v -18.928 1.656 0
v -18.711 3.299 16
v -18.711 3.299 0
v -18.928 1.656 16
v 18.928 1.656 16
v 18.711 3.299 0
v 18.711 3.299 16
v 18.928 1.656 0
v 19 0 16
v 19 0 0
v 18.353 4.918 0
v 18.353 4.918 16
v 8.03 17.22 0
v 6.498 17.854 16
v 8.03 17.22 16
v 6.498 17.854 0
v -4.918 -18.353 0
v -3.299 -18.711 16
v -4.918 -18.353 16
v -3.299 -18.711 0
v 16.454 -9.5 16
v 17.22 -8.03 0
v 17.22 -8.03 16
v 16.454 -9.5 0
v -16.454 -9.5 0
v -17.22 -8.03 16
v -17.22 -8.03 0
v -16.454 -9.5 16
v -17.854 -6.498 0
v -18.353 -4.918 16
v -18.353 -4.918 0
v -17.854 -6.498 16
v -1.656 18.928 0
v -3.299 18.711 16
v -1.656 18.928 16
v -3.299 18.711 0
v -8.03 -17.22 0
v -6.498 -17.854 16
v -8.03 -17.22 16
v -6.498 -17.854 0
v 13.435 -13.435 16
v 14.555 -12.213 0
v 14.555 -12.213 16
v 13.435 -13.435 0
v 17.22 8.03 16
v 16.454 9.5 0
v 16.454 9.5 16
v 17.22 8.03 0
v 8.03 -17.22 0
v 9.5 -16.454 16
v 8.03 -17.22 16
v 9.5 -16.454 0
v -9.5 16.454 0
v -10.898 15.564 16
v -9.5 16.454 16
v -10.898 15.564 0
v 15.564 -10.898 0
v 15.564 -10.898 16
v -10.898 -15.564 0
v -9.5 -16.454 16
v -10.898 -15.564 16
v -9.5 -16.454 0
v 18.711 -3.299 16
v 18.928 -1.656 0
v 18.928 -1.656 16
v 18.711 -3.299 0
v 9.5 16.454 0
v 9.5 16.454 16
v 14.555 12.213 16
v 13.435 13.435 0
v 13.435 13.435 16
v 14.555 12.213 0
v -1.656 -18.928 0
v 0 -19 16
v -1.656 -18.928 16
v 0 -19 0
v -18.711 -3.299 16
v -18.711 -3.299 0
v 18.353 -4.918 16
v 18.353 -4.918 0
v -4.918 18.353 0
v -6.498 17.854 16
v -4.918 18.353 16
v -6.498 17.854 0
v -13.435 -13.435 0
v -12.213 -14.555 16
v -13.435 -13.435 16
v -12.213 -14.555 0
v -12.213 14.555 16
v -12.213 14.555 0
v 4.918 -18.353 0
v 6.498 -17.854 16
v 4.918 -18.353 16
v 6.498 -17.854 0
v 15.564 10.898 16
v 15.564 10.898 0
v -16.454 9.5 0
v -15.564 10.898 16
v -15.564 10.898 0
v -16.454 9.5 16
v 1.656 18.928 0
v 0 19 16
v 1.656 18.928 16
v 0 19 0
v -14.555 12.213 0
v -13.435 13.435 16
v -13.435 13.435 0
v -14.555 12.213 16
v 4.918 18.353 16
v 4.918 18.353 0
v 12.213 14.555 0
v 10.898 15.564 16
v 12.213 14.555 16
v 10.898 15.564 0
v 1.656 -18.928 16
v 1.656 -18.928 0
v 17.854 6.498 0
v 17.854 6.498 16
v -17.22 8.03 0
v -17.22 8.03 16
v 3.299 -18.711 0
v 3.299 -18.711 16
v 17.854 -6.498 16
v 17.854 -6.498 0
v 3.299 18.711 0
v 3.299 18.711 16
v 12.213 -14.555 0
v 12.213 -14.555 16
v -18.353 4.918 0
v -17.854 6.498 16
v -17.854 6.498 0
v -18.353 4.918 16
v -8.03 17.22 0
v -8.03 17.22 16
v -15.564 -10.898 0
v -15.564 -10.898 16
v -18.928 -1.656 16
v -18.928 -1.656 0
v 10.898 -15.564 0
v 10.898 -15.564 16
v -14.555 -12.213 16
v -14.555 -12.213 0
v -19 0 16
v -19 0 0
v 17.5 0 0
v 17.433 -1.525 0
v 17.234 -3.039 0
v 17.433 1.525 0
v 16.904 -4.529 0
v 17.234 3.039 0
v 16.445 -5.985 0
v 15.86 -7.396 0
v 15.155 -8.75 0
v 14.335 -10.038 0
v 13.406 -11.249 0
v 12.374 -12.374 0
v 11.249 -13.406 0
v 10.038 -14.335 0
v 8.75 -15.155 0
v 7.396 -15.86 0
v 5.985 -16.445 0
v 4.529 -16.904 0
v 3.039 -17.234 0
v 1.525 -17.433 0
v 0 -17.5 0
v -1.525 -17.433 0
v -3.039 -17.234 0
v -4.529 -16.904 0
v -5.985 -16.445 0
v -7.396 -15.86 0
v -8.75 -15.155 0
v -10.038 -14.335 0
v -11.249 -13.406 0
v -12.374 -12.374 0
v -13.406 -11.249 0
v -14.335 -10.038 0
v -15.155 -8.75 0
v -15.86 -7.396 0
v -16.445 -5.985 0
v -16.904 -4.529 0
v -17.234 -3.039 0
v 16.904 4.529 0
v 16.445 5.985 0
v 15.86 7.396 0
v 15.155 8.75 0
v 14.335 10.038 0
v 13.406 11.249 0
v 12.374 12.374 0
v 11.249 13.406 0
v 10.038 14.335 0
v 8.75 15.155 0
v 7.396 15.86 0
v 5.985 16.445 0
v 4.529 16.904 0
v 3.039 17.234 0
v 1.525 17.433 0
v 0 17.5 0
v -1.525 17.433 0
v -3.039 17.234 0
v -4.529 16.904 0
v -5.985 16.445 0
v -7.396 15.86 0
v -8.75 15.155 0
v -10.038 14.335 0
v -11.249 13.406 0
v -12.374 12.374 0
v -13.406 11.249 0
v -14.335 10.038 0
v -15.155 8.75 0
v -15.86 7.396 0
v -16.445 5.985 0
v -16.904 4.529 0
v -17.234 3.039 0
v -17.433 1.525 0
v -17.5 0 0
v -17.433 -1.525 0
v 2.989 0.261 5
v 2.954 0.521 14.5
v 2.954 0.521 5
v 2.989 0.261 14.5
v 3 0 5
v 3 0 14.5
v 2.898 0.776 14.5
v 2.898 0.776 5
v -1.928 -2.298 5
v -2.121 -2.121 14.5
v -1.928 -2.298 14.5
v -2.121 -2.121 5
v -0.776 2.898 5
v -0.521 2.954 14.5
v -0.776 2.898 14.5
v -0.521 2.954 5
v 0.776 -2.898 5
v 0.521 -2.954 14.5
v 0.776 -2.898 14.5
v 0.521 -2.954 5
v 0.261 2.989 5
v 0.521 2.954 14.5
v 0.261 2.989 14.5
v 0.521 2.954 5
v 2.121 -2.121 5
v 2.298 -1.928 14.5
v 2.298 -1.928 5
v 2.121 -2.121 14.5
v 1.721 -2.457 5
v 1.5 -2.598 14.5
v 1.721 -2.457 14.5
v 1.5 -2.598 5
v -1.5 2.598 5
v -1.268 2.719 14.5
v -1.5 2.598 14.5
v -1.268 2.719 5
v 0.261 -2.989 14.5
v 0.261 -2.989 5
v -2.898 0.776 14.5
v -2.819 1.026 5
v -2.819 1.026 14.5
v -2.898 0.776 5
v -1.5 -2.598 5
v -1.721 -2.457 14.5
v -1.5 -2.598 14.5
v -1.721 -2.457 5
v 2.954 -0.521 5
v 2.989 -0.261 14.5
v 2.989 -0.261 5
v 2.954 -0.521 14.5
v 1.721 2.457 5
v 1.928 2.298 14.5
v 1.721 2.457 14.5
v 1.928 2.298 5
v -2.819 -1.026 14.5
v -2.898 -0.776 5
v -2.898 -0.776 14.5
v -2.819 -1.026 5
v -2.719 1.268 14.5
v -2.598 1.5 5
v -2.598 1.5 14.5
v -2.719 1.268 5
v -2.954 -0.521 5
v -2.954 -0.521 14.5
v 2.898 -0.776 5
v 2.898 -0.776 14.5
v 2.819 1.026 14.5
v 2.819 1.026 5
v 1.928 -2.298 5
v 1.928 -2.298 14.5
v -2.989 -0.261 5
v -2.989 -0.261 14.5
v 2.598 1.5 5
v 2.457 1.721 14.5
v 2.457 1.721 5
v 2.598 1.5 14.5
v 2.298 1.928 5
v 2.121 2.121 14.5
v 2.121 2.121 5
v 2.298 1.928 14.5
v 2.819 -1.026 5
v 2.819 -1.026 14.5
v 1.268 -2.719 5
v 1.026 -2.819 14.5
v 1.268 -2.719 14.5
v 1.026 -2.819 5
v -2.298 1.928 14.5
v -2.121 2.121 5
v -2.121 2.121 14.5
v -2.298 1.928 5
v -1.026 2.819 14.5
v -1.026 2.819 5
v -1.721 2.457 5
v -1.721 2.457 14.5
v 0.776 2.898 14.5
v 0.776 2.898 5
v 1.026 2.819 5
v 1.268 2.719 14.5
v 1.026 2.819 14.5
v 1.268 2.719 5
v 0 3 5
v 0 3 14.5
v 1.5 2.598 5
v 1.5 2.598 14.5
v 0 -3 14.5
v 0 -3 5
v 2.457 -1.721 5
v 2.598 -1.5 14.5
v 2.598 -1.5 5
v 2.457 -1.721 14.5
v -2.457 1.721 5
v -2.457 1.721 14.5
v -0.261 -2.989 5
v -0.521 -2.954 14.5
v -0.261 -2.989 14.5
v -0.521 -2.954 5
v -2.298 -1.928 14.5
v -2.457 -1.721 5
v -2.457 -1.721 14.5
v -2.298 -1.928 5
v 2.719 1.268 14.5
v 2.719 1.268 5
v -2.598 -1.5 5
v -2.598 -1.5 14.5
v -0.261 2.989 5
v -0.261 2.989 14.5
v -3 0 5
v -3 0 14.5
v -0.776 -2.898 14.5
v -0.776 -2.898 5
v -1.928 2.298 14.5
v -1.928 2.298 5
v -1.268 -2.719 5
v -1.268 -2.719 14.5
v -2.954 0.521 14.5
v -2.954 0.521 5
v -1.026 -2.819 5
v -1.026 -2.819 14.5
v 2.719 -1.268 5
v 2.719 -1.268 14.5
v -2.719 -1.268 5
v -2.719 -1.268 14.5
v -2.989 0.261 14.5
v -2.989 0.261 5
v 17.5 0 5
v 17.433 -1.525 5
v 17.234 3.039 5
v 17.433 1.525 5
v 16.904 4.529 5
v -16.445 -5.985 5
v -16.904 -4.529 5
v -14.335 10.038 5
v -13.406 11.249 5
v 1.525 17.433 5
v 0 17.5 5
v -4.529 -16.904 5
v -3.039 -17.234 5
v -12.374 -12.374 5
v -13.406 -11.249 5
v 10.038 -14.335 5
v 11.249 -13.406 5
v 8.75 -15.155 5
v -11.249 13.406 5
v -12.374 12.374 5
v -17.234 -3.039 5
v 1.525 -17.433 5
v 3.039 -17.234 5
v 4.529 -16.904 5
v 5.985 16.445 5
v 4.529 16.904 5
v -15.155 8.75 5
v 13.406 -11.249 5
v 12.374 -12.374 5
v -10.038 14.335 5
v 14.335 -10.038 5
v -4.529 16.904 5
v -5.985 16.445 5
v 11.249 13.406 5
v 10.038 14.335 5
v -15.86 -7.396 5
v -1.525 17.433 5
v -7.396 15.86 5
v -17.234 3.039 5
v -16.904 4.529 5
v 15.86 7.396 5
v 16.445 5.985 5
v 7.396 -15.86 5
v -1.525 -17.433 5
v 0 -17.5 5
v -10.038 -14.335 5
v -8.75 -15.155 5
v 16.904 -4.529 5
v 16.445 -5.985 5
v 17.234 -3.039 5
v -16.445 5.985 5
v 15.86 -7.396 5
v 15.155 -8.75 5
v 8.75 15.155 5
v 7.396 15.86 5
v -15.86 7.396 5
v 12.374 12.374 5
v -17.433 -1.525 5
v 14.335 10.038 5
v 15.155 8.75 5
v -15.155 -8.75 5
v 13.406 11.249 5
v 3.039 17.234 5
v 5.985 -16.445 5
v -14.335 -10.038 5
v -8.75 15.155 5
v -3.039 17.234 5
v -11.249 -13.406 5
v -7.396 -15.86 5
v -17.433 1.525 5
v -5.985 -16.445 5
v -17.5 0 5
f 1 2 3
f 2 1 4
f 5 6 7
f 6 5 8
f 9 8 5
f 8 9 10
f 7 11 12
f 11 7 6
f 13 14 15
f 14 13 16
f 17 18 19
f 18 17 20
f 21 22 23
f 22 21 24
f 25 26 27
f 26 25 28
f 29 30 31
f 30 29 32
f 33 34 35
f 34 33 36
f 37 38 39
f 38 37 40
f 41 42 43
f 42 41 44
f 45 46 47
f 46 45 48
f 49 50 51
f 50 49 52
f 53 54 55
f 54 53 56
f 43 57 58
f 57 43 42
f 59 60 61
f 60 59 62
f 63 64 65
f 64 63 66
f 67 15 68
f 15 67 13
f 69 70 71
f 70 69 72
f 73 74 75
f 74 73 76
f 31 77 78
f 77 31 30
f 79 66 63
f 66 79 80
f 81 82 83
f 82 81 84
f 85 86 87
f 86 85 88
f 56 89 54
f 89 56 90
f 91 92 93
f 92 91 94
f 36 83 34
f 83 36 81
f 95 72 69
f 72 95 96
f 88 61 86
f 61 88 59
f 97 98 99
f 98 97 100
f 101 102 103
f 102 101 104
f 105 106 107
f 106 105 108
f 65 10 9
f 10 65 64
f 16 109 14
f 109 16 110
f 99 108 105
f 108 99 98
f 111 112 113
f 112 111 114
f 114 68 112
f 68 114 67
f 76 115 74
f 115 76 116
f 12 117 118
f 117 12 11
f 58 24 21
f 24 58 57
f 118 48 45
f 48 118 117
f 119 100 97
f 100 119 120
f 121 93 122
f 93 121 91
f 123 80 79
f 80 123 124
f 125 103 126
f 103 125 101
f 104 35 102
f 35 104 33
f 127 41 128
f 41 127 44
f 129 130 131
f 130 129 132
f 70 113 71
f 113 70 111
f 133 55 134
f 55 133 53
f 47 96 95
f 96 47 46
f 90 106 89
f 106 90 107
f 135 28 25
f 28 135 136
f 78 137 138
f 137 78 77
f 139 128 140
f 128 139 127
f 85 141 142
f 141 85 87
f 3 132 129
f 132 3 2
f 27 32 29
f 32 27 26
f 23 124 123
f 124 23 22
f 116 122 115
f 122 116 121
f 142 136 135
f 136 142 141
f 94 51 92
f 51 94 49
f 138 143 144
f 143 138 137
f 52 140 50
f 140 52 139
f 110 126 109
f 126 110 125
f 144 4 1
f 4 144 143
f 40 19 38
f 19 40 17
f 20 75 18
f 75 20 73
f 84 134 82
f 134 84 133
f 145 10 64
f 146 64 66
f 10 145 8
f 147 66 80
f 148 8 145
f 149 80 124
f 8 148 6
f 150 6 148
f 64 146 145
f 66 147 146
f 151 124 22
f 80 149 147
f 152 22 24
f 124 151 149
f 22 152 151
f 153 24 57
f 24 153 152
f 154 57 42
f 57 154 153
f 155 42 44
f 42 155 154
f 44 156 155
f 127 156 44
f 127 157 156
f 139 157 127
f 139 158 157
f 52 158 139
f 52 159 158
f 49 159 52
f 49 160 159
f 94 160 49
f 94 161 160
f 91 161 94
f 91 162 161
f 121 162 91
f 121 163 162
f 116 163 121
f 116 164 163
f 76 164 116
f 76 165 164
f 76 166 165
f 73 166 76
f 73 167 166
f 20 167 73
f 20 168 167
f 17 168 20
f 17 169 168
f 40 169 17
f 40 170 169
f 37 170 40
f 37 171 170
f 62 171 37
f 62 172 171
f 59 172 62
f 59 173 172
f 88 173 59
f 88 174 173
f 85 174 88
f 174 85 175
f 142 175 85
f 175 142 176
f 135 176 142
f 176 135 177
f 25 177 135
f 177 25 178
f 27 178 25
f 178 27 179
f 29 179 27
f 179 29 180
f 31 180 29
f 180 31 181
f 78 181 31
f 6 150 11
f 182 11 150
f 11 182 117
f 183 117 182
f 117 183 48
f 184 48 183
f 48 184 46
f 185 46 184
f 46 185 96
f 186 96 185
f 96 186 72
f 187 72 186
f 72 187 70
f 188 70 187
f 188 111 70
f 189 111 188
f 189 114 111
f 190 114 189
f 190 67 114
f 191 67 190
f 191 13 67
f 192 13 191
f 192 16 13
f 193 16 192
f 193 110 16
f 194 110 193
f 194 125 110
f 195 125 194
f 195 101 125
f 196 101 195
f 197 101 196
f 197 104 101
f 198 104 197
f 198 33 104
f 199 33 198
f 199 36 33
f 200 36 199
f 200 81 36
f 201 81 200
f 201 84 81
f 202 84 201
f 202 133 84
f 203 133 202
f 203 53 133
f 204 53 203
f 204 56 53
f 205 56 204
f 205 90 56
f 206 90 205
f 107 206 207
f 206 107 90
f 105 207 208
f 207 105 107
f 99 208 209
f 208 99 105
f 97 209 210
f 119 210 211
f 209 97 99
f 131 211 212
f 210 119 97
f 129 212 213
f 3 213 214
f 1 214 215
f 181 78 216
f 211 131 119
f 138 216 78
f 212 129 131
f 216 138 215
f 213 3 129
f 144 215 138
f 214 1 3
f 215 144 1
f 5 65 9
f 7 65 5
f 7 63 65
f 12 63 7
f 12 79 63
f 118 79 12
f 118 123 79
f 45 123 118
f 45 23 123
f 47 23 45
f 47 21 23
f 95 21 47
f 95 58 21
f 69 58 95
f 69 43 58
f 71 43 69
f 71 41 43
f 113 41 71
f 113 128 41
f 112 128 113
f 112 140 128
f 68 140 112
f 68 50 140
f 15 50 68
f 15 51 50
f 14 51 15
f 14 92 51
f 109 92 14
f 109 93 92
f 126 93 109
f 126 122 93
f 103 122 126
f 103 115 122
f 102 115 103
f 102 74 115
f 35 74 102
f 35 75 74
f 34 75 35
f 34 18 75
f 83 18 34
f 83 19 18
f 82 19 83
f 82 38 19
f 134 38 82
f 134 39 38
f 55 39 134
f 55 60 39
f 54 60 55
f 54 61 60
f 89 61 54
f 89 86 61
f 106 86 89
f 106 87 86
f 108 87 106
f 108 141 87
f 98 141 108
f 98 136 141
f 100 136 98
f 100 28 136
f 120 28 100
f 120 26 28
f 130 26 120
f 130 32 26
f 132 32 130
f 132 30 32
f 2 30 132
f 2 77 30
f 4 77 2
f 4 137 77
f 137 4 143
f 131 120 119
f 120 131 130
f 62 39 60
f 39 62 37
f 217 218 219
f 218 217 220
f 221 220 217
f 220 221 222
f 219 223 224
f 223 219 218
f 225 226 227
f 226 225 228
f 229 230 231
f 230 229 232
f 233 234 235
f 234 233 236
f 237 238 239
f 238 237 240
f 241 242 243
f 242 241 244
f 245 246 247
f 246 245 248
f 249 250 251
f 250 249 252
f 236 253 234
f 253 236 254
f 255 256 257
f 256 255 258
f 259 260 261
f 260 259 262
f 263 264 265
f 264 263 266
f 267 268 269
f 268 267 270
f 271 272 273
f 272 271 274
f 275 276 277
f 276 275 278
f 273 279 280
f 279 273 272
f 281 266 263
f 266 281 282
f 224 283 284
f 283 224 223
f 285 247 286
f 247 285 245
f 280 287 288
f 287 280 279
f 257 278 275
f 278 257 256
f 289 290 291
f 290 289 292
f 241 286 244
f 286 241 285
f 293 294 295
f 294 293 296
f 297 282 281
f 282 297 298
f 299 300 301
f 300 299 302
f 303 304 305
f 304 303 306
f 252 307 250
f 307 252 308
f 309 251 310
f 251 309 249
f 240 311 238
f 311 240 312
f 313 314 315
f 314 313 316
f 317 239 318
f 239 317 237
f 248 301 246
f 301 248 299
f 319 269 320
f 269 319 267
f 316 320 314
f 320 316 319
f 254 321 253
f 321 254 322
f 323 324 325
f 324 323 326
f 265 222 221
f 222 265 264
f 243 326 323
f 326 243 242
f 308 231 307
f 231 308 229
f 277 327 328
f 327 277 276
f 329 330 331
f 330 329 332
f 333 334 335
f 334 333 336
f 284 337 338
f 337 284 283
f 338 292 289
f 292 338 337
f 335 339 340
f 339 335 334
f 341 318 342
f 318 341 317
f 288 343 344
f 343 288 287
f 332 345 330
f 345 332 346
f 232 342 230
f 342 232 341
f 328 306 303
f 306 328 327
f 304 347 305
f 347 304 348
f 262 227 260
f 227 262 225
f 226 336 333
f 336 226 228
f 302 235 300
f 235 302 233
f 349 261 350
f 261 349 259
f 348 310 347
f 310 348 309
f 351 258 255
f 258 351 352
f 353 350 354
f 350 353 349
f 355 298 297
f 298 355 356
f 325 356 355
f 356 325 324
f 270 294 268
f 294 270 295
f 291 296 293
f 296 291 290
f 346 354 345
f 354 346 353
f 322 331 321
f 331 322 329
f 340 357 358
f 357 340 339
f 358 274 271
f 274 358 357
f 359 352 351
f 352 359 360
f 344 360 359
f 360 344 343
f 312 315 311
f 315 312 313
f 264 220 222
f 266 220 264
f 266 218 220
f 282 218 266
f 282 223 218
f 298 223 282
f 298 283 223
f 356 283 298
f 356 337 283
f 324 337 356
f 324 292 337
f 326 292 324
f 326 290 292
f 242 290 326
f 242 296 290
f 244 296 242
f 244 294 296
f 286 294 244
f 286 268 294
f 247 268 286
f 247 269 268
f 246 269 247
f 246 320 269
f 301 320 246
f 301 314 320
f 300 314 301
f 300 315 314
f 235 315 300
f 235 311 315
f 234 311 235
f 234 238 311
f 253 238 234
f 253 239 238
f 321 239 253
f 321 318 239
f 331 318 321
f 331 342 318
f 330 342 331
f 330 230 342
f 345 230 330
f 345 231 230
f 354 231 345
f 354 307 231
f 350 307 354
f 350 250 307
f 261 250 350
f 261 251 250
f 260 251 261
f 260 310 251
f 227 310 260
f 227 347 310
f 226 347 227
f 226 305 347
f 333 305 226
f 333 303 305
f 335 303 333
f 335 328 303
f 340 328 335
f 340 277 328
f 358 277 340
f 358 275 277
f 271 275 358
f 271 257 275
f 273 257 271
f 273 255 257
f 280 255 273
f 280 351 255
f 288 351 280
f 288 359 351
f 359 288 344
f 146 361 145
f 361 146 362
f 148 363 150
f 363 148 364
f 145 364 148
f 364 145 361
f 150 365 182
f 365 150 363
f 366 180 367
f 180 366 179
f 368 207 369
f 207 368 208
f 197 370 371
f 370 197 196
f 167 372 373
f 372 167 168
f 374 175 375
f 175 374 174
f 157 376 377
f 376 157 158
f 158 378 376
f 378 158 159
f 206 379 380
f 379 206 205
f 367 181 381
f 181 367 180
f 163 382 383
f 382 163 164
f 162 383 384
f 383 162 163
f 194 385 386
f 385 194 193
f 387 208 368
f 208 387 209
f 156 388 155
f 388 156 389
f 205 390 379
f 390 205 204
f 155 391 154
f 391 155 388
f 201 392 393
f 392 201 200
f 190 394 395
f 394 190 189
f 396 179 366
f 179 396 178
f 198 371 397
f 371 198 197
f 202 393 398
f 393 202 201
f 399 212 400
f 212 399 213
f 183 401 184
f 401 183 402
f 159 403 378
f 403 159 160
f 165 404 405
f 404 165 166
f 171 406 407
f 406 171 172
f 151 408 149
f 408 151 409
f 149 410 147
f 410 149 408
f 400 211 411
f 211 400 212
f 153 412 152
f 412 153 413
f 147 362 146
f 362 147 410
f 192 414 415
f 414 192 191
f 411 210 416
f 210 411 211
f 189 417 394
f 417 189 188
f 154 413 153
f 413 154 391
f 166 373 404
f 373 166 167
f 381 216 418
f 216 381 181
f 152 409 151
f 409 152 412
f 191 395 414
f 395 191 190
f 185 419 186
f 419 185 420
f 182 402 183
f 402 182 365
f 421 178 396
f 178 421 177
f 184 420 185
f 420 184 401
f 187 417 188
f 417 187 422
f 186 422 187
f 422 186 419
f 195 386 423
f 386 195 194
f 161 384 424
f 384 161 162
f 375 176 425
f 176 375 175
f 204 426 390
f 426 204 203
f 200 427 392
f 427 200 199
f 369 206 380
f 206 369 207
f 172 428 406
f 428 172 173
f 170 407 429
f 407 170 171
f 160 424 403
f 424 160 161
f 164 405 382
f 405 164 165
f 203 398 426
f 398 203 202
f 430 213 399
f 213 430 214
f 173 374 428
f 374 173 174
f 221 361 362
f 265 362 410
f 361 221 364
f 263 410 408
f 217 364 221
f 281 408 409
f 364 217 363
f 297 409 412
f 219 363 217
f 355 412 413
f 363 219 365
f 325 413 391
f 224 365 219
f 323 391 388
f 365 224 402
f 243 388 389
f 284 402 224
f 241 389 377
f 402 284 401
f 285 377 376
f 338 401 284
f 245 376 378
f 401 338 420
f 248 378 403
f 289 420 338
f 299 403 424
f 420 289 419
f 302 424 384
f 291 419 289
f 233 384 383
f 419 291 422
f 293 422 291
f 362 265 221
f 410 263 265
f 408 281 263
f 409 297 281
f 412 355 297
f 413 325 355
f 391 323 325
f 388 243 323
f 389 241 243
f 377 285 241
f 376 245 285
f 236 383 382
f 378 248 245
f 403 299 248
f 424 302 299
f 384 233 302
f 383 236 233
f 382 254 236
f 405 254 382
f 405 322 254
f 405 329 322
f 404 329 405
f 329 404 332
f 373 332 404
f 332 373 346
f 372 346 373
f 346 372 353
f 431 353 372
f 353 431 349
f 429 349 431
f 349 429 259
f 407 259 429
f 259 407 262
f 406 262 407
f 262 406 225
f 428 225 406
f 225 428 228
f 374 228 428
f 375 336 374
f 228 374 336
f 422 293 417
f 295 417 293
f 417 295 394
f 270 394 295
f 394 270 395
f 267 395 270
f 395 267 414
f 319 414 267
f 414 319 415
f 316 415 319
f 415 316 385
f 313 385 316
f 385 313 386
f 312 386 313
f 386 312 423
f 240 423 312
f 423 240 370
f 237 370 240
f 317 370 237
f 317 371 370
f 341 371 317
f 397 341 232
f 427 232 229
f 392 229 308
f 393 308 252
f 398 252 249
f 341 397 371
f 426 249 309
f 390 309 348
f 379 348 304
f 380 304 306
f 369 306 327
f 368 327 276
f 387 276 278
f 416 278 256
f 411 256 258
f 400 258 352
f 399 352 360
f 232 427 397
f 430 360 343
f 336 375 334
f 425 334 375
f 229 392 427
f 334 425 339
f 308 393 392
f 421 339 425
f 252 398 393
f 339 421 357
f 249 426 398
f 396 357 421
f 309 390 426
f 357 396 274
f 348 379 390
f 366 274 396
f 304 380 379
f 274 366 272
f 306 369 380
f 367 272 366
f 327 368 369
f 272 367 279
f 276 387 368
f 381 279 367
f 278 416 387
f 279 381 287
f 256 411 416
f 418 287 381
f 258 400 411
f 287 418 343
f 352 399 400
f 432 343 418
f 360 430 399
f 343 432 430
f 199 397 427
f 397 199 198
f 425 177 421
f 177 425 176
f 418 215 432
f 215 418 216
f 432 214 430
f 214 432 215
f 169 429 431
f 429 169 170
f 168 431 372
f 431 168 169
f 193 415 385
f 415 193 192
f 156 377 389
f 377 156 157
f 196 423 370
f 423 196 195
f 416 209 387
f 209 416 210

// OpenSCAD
//---------------------------------------------------------------------------------------------
//-- Printable holder for washer
//-- (c) Martin Korinek	m.ko@inode.at
//-- Jan-2015
//---------------------------------------------------------------------------------------------
//--
//---------------------------------------------------------------------------------------------

//fragment minimum angle
  $fa=5.0;

//fragment minimum size
  $fs=0.1;
  
difference()
{  
	
	cylinder(h = 16, d = 38);
	translate([0,0,-1])
	cylinder(h = 15.5, d = 6);
	translate([0,0,-1])
	cylinder(h = 6, d = 35);
} 
